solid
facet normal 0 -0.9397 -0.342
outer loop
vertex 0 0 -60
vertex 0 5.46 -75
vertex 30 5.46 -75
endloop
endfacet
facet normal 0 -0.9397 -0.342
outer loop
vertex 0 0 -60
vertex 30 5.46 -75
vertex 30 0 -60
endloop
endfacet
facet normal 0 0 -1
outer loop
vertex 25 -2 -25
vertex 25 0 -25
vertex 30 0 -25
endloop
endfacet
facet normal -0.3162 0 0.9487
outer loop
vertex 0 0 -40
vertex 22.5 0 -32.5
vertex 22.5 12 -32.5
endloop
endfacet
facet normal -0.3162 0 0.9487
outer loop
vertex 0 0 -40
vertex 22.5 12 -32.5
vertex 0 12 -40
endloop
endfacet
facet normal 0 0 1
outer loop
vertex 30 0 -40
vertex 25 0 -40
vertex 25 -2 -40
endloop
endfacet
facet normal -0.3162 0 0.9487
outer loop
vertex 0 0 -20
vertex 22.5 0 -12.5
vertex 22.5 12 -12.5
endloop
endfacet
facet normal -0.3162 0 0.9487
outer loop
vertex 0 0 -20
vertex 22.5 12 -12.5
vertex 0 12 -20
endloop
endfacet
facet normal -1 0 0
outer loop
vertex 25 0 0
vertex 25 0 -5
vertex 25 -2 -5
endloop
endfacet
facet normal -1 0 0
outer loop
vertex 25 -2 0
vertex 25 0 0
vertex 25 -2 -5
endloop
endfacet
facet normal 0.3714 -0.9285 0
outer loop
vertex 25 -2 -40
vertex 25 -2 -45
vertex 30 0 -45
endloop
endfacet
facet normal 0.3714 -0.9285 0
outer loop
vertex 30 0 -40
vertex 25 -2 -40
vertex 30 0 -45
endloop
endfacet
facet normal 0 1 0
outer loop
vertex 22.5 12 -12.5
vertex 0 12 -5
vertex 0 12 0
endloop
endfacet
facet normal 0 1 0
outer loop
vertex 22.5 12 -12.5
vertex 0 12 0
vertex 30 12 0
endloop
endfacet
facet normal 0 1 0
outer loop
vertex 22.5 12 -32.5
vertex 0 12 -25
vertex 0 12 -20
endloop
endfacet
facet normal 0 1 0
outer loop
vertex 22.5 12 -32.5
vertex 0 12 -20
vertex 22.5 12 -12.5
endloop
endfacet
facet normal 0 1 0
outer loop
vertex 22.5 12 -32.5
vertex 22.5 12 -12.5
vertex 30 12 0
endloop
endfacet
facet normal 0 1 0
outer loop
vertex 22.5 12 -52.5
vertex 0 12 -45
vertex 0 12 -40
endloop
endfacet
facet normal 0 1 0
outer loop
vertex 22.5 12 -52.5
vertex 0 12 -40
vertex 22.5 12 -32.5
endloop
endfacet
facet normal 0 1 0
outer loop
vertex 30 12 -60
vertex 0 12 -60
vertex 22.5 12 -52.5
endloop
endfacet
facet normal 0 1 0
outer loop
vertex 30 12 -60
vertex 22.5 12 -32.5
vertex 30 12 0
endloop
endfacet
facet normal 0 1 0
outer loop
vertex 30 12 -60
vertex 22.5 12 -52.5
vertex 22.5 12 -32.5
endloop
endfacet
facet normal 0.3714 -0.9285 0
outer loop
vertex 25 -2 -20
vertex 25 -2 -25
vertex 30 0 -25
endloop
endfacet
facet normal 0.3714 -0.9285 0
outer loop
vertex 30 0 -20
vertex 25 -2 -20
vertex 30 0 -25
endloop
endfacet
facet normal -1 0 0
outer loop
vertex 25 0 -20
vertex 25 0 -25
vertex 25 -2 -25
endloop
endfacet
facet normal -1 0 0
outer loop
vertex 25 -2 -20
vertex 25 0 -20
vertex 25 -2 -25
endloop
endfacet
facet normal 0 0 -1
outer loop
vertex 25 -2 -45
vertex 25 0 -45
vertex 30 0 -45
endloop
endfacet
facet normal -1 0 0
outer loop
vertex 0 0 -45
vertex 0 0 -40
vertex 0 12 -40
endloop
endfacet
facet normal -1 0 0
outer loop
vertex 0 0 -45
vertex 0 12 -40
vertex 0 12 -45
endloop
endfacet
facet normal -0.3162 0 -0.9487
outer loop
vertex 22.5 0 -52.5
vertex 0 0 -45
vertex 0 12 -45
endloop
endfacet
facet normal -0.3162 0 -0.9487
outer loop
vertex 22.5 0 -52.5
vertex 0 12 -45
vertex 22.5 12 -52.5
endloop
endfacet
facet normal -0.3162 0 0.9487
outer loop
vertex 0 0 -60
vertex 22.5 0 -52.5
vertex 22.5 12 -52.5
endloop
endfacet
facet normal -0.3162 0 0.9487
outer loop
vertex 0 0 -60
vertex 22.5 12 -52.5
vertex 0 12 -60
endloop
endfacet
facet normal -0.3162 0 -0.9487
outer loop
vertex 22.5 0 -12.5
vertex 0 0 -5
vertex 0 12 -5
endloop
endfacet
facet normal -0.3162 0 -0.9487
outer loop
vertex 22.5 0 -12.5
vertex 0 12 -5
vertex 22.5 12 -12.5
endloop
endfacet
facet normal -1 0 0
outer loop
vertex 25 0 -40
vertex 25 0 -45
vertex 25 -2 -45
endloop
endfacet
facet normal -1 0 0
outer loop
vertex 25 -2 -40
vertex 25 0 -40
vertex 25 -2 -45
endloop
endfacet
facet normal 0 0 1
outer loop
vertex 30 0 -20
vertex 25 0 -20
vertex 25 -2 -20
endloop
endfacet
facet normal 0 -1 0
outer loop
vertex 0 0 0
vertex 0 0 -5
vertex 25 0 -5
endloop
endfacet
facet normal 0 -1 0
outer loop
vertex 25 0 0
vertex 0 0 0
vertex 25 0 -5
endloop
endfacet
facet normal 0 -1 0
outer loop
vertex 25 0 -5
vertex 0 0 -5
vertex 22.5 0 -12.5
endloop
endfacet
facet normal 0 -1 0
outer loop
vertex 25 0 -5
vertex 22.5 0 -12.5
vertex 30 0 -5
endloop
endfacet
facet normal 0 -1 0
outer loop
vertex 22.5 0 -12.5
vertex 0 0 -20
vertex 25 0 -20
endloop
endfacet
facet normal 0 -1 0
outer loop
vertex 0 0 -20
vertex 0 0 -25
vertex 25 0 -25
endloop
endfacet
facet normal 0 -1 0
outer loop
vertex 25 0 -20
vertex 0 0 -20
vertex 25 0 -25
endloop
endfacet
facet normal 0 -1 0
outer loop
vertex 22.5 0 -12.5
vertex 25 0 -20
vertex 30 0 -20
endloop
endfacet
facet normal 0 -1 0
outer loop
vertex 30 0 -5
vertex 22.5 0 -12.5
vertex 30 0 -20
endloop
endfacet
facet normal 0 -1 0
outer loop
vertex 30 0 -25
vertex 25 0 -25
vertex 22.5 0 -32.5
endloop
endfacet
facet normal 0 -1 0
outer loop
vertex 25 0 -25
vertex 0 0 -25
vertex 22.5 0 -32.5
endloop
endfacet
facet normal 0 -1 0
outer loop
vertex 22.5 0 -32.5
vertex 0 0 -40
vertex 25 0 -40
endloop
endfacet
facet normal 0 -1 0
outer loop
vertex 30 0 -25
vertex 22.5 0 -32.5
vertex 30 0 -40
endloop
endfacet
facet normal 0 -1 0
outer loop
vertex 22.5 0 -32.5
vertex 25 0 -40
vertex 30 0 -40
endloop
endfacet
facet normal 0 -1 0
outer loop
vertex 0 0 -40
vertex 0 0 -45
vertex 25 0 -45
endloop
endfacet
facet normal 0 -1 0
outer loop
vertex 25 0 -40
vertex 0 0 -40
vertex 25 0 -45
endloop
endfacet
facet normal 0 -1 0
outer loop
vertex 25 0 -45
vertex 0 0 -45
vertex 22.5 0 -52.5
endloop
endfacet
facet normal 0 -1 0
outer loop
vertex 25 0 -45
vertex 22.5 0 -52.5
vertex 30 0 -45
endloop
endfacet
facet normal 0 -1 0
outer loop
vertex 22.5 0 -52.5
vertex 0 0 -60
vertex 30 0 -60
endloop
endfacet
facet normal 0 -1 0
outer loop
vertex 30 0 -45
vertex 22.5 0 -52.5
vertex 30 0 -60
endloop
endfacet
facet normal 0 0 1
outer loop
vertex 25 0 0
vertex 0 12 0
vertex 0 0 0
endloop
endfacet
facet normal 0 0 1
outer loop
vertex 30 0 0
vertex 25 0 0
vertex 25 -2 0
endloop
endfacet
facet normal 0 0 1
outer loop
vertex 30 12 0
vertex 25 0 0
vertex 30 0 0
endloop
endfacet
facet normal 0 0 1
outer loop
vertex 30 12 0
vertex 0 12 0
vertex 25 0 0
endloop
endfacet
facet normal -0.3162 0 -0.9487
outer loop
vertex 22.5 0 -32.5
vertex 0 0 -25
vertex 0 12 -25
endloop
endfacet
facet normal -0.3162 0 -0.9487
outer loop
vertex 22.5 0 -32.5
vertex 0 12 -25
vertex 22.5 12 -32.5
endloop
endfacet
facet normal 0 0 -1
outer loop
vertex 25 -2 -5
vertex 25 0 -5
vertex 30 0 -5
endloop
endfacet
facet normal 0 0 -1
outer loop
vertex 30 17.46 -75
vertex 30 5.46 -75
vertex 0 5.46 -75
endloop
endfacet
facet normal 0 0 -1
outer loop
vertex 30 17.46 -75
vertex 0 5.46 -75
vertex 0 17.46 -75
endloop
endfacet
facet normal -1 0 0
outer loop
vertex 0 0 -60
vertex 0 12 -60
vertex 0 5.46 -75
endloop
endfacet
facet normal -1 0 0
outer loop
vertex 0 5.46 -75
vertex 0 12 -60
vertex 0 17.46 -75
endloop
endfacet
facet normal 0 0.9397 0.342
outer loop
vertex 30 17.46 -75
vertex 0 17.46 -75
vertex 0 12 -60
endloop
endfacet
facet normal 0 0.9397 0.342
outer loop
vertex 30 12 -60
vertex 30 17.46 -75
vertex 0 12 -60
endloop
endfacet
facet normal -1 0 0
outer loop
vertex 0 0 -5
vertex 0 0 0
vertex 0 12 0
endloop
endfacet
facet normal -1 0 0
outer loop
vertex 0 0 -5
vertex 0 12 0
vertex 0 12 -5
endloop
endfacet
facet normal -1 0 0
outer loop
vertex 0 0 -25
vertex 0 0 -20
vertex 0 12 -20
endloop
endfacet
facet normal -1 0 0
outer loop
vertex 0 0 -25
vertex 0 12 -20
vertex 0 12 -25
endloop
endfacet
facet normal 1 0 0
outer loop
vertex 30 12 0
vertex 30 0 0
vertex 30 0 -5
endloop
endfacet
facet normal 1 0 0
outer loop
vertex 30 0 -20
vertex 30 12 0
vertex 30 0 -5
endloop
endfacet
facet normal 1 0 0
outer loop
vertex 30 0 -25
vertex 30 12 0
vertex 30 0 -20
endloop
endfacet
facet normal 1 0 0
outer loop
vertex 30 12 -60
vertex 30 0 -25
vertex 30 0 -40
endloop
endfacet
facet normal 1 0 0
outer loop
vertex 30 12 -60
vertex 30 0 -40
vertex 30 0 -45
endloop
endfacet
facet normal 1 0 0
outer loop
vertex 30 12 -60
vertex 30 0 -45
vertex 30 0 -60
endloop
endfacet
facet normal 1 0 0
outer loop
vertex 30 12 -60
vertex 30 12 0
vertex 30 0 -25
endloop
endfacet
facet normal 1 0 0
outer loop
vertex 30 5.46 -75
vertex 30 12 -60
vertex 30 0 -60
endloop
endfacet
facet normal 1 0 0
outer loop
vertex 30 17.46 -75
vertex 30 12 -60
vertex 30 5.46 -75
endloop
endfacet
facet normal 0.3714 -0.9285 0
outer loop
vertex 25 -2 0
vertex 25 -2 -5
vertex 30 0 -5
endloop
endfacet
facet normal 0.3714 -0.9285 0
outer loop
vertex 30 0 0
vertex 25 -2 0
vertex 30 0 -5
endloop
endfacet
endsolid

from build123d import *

# Parameters (mm, degrees)
SKETCH1_W           = 30
SKETCH1_H           = 75
BOSS_EXTRUDE1_DEPTH = 12
CUT_EXTRUDE1_DEPTH  = 12
LPATTERN1_COUNT     = 3
LPATTERN1_PITCH     = 20
CUT_EXTRUDE2_DEPTH  = 30
BOSS_EXTRUDE2_DEPTH = 30
BOUNDARY1_START     = -45
BOUNDARY1_DEPTH     = 5
LPATTERN2_COUNT     = 3
LPATTERN2_PITCH     = 20


# Read off the part's stored shape, not the designer's step: Boundary1
with BuildPart() as part:
    # Sketch1 → Boss-Extrude1 (new body)
    with BuildSketch(Plane(origin=(0, 0, 0), x_dir=(1, 0, 0), z_dir=(0, 1, 0))):
        with Locations((15, 37.5)):
            Rectangle(SKETCH1_W, SKETCH1_H)
    extrude(amount=BOSS_EXTRUDE1_DEPTH)

    # Sketch3 → Cut-Extrude1 (cut)
    with BuildSketch(Plane(origin=(0, 0, 0), x_dir=(1, 0, 0), z_dir=(0, 1, 0))):
        Polygon((0, 5), (22.5, 12.5), (0, 20), align=None)
    cut_extrude1 = extrude(amount=CUT_EXTRUDE1_DEPTH, mode=Mode.SUBTRACT)

    # LPattern1: Cut-Extrude1 ×3
    with Locations(*[(0, 0, -i * LPATTERN1_PITCH) for i in range(1, LPATTERN1_COUNT)]):
        add(cut_extrude1, mode=Mode.SUBTRACT)

    # Sketch6 → Cut-Extrude2 (cut)
    with BuildSketch(Plane(origin=(0, 0, 0), x_dir=(0, 0, -1), z_dir=(1, 0, 0))):
        Polygon((60, 0), (75, 0), (75, 5.459553514), align=None)
    extrude(amount=CUT_EXTRUDE2_DEPTH, mode=Mode.SUBTRACT)

    # Sketch12 → Boss-Extrude2 (add)
    with BuildSketch(Plane.ZY):
        Polygon((-60, 12), (-75, 12), (-75, 17.459553514), align=None)
    extrude(amount=-BOSS_EXTRUDE2_DEPTH)

    # Boundary1 outline → Boundary1 (add)
    with BuildSketch(Plane.XY.offset(BOUNDARY1_START)):
        Polygon((25, 0), (25, -2), (30, 0), align=None)
    boundary1 = extrude(amount=BOUNDARY1_DEPTH)

    # LPattern2: Boundary1 ×3
    with Locations(*[(0, 0, i * LPATTERN2_PITCH) for i in range(1, LPATTERN2_COUNT)]):
        add(boundary1)


solid = part.part
